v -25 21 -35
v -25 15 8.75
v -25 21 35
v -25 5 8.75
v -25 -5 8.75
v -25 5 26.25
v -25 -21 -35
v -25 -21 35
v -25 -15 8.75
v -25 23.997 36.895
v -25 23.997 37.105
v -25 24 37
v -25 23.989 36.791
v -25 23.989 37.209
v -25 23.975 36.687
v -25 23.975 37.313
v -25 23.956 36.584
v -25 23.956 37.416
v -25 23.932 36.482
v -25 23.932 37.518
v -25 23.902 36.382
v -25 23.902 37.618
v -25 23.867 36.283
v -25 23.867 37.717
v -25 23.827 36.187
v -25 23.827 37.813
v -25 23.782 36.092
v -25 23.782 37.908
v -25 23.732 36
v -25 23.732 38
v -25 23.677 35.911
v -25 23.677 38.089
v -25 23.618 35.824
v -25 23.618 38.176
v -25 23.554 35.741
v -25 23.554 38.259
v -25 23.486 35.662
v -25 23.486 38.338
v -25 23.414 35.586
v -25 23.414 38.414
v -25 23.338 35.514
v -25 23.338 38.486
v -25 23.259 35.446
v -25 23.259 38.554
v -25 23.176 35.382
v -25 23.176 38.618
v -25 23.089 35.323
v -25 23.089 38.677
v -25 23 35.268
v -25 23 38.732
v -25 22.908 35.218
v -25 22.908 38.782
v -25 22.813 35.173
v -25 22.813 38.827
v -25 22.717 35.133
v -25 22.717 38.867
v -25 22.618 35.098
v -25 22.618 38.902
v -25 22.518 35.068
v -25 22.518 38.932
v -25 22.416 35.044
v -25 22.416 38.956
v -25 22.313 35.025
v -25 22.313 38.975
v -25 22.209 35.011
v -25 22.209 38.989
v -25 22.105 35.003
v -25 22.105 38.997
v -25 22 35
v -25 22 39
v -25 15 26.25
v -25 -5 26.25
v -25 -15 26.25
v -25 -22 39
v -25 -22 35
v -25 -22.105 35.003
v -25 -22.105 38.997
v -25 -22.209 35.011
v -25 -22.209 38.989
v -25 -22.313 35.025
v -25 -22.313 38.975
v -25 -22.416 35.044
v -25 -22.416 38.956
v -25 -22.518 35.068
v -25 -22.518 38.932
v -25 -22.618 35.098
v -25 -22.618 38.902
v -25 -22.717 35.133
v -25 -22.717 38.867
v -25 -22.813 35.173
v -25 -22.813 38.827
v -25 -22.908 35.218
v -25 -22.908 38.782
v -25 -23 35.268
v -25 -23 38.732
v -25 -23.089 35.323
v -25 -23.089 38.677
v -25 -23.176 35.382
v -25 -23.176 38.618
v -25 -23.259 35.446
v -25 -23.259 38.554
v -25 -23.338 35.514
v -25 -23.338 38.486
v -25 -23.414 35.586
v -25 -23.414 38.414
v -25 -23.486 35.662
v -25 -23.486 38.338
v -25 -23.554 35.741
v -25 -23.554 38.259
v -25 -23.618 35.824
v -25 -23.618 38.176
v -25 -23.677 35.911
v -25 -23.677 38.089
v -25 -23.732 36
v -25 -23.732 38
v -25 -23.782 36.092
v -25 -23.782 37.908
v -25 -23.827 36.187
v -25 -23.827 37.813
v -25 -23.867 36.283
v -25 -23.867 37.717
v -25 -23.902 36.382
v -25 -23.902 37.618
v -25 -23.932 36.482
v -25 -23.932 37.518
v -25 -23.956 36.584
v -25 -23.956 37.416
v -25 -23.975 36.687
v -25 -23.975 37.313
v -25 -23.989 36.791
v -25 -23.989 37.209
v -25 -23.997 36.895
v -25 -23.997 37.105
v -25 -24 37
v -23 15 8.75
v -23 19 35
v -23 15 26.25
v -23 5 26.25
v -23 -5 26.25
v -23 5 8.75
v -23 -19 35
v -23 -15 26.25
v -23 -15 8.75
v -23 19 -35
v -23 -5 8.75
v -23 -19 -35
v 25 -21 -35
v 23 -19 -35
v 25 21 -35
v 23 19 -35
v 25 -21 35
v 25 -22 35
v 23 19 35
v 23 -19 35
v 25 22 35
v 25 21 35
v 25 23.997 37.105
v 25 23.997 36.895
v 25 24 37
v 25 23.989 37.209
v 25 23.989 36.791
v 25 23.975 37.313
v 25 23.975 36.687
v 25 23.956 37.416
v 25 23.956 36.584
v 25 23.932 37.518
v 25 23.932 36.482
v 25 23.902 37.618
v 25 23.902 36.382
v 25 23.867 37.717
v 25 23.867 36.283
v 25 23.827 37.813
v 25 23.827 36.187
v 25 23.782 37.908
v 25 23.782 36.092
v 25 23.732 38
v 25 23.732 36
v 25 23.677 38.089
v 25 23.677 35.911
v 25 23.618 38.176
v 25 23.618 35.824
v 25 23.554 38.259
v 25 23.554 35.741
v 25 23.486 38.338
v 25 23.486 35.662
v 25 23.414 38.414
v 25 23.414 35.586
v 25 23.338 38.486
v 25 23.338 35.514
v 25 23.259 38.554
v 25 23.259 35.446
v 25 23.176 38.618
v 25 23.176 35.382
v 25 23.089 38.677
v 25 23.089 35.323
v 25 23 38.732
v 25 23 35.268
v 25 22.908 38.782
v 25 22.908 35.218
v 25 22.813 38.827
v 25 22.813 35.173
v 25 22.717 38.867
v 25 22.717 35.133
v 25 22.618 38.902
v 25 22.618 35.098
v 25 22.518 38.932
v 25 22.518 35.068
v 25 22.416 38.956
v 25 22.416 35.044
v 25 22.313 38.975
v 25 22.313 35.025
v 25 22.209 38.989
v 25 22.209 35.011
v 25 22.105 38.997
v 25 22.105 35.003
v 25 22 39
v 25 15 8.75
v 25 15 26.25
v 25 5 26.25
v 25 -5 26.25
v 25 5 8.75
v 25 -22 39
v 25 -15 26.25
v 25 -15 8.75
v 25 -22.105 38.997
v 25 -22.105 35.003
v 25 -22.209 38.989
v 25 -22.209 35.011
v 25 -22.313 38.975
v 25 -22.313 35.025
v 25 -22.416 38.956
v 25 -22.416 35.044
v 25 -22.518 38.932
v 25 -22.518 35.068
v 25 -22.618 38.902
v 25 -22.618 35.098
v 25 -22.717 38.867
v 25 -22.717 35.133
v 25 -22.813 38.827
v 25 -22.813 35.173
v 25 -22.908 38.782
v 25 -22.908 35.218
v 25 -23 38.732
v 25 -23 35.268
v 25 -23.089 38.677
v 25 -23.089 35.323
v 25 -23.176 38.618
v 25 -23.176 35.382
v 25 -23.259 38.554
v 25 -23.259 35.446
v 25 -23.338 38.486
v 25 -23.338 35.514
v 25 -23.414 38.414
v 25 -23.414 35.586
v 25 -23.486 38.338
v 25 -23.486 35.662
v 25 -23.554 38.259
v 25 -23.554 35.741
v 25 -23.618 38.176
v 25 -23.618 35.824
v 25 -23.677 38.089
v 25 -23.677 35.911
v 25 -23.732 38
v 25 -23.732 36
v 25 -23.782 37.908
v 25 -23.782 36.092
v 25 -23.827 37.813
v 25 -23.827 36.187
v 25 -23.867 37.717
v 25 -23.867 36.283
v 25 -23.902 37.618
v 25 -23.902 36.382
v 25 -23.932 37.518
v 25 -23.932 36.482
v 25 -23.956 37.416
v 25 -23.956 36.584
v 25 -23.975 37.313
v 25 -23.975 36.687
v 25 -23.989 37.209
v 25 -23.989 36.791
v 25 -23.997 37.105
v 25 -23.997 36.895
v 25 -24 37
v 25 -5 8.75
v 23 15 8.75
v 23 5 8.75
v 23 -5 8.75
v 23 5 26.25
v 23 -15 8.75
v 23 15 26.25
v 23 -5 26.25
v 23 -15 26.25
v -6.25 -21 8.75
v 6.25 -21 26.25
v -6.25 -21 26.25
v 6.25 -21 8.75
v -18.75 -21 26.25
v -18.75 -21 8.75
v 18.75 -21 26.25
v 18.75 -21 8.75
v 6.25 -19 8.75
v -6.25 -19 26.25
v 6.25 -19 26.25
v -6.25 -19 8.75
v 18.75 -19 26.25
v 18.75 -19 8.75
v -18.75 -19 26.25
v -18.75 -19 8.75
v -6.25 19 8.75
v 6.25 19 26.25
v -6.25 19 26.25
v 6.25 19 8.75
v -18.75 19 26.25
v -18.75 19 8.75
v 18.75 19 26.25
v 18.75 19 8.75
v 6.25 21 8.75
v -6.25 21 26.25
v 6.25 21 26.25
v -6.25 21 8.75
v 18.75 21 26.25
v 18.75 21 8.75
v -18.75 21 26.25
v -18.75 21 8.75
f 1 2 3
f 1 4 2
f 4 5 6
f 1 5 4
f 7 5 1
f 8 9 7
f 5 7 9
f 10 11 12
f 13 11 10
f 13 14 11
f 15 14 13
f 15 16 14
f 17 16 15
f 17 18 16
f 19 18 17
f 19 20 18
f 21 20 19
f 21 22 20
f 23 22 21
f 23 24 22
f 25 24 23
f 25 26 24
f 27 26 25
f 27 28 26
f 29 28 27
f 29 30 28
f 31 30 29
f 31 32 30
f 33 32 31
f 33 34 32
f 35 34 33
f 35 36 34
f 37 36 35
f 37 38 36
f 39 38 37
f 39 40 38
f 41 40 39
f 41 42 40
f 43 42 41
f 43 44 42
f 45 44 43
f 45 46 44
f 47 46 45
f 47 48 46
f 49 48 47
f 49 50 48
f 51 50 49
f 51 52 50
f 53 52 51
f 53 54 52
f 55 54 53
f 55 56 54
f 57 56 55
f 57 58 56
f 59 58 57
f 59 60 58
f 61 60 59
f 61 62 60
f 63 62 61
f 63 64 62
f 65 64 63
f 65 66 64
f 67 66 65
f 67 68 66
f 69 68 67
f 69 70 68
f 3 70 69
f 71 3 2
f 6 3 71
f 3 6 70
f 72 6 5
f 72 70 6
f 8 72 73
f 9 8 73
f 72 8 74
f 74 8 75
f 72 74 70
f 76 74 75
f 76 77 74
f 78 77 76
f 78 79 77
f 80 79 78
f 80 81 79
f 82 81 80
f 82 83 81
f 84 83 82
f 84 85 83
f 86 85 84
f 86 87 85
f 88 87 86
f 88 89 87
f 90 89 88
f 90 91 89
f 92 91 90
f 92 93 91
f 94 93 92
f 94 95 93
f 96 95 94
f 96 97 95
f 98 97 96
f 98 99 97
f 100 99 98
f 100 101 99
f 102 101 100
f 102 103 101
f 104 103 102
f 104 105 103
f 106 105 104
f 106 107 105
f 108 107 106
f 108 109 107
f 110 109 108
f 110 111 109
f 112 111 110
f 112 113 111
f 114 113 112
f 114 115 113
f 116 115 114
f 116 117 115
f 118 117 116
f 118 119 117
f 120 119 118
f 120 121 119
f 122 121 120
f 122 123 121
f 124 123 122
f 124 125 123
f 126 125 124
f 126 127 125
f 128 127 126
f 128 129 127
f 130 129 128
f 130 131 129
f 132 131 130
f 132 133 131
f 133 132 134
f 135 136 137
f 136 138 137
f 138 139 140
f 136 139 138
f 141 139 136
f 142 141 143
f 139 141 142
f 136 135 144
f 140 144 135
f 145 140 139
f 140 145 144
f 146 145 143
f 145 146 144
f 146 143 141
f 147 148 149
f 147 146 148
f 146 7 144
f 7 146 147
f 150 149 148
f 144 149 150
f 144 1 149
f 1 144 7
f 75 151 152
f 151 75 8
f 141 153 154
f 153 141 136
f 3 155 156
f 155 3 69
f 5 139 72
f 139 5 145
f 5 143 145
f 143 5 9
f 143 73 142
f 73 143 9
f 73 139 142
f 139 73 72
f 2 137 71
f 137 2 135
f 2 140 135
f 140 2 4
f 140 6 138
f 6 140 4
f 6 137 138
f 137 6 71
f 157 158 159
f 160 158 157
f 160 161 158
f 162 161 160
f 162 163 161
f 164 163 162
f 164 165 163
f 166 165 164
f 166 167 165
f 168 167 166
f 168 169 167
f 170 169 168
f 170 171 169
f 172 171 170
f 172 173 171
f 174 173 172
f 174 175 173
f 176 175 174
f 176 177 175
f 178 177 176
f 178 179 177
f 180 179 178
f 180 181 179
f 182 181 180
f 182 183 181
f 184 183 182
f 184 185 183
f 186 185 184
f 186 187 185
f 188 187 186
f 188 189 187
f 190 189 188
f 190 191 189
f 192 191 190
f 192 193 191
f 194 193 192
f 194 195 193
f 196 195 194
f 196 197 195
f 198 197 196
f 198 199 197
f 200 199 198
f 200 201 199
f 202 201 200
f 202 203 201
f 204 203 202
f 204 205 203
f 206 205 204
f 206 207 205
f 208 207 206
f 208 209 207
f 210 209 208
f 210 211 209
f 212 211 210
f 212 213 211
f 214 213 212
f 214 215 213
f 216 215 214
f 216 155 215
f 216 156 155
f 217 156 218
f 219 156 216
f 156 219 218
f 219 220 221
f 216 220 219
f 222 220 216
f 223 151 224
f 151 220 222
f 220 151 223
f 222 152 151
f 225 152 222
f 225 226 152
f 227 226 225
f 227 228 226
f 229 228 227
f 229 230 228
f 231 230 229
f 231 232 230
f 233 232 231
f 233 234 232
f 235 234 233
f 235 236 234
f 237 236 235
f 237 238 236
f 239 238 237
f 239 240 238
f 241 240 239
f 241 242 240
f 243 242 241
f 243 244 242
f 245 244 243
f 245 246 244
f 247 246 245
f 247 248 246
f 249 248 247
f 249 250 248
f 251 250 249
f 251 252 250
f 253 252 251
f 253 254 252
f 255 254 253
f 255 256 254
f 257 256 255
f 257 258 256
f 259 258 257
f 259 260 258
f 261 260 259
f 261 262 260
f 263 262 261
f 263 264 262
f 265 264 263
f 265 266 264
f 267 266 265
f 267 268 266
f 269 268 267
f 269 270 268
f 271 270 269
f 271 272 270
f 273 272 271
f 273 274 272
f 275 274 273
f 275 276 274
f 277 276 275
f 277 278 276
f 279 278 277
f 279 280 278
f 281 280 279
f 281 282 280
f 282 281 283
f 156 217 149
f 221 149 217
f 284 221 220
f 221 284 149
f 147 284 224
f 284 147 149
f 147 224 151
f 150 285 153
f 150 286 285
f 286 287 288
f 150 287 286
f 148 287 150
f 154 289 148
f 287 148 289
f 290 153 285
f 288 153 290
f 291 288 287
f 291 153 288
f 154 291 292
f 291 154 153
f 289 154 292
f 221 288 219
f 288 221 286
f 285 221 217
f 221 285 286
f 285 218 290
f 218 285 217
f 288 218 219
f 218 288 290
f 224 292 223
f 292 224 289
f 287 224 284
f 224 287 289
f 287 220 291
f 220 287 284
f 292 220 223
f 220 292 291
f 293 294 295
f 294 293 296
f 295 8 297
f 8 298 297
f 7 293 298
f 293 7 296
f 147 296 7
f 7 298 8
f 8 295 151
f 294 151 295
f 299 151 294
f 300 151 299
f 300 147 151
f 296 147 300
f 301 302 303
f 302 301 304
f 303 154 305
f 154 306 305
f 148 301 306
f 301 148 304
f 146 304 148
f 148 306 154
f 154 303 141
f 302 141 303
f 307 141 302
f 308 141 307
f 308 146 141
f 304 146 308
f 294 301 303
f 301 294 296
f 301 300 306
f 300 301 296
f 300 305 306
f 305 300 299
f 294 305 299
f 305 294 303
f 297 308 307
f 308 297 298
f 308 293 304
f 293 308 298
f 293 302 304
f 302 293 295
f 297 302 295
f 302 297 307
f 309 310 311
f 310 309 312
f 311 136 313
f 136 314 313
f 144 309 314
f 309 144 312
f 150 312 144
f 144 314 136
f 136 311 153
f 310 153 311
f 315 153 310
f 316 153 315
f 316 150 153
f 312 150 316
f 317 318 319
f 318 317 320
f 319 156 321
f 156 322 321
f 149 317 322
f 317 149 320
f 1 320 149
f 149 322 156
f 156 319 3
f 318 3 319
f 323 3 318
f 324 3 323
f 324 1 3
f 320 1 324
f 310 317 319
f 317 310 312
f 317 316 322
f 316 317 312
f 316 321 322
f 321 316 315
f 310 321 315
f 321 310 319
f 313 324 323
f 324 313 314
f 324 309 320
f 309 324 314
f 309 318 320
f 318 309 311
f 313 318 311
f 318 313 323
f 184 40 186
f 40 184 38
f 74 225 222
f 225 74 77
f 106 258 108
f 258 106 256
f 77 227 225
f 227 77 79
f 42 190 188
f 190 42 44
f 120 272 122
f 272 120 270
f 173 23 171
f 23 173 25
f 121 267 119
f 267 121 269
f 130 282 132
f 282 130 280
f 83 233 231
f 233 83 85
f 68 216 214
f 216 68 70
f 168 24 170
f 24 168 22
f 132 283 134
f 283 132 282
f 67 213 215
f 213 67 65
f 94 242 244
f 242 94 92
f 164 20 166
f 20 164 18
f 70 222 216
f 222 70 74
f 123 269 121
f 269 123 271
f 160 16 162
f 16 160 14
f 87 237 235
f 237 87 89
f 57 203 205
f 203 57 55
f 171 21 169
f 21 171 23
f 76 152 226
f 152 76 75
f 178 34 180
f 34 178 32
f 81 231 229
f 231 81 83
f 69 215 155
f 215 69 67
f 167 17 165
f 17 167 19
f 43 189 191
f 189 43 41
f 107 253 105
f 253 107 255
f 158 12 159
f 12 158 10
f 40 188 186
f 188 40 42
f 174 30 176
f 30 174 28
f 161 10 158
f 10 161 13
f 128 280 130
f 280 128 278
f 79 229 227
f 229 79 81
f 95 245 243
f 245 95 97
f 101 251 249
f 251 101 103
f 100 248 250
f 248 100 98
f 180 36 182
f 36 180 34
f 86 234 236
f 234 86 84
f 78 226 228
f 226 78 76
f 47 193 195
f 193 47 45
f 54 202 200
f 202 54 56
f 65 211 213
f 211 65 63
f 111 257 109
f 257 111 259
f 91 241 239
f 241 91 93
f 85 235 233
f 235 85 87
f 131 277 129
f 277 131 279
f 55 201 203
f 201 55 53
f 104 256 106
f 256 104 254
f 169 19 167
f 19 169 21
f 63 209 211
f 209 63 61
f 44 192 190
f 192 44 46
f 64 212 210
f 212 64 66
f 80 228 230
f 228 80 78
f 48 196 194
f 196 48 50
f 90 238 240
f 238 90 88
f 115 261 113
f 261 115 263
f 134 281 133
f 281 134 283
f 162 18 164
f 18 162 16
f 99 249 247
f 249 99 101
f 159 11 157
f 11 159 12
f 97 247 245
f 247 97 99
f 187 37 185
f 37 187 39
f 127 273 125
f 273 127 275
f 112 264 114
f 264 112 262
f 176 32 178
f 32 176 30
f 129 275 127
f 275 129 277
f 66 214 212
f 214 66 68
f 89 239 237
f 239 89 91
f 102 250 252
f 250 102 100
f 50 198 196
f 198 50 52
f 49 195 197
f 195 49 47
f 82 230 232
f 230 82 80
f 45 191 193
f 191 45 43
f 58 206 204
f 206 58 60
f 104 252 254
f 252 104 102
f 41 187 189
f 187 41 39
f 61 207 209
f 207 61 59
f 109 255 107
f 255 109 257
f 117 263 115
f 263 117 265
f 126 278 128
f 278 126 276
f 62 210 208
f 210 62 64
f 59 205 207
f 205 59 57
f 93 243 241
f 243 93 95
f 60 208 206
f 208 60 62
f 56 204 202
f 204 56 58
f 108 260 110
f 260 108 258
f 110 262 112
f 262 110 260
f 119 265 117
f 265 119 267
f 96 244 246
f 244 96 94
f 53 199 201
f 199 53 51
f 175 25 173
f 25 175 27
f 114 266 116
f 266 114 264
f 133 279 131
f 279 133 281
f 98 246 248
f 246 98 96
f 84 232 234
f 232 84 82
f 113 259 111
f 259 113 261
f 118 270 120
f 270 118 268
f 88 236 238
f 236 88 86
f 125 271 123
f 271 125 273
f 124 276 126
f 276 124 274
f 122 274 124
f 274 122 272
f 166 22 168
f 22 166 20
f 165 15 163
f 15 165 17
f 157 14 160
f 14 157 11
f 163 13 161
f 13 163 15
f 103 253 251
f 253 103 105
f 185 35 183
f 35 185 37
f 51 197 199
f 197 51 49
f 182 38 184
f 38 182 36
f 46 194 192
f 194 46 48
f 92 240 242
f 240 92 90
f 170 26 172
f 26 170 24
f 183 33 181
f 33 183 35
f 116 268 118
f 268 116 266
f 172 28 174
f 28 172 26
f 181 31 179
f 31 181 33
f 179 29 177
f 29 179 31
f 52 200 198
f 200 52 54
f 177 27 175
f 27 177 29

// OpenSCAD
///////////////////////////////////////////////////////////////////////////////
// Filename 		: Cabin.scad
// Main Module   	: Train
// Sub-module	: Cabin
// Version  		: v1.0
// Category 		: Transportation
// Modified 		: 14 Sept 2016
// Author   		: Jason Yeo
///////////////////////////////////////////////////////////////////////////////
// Refer to drawing for Train - Dimension parameters.
//
// A SIMPLE CABIN
// 
///////////////////////////////////////////////////////////////////////////////
//wall();
$fn=120;
Cabin();

module Cabin(l1=50, b1=40, h1=70, t1=2)
{
	translate([-l1/2+t1/2,0,0]) rotate([-90,0,-90]) wall(b1,h1,t1,2);
	translate([+l1/2-t1/2,0,0]) rotate([-90,0,+90]) wall(b1,h1,t1,2);
	translate([0,-b1/2,0]) rotate([-90,0,0]) wall(l1,h1,t1,2);
	translate([0,+b1/2,0]) rotate([-90,0,0]) wall(l1,h1,t1,2);
    color("Red")hull(){
	translate([0,-b1/2-t1,h1/2+t1]) rotate([0,90,0]) cylinder(l1, t1, t1, true);
	translate([0,+b1/2+t1,h1/2+t1]) rotate([0,90,0]) cylinder(l1, t1, t1, true);
    }
}

module wall(width = 150, height = 150, thickness = 2, noOfWindows = 2)
{
	windowHeight = height / (noOfWindows + 2);
	windowWidth = width / (noOfWindows + 2);
	echo("width=",width, windowWidth, windowHeight);
	color("Orange")
    translate([0,0,-thickness/2])linear_extrude(thickness)
	difference(){
		square([width, height], center=true);
		for(i=[0:noOfWindows-1])
			translate([width/2-windowWidth-windowWidth*i*2, -height/4, 0]) square([windowWidth, windowHeight], center=true);
	}
}
